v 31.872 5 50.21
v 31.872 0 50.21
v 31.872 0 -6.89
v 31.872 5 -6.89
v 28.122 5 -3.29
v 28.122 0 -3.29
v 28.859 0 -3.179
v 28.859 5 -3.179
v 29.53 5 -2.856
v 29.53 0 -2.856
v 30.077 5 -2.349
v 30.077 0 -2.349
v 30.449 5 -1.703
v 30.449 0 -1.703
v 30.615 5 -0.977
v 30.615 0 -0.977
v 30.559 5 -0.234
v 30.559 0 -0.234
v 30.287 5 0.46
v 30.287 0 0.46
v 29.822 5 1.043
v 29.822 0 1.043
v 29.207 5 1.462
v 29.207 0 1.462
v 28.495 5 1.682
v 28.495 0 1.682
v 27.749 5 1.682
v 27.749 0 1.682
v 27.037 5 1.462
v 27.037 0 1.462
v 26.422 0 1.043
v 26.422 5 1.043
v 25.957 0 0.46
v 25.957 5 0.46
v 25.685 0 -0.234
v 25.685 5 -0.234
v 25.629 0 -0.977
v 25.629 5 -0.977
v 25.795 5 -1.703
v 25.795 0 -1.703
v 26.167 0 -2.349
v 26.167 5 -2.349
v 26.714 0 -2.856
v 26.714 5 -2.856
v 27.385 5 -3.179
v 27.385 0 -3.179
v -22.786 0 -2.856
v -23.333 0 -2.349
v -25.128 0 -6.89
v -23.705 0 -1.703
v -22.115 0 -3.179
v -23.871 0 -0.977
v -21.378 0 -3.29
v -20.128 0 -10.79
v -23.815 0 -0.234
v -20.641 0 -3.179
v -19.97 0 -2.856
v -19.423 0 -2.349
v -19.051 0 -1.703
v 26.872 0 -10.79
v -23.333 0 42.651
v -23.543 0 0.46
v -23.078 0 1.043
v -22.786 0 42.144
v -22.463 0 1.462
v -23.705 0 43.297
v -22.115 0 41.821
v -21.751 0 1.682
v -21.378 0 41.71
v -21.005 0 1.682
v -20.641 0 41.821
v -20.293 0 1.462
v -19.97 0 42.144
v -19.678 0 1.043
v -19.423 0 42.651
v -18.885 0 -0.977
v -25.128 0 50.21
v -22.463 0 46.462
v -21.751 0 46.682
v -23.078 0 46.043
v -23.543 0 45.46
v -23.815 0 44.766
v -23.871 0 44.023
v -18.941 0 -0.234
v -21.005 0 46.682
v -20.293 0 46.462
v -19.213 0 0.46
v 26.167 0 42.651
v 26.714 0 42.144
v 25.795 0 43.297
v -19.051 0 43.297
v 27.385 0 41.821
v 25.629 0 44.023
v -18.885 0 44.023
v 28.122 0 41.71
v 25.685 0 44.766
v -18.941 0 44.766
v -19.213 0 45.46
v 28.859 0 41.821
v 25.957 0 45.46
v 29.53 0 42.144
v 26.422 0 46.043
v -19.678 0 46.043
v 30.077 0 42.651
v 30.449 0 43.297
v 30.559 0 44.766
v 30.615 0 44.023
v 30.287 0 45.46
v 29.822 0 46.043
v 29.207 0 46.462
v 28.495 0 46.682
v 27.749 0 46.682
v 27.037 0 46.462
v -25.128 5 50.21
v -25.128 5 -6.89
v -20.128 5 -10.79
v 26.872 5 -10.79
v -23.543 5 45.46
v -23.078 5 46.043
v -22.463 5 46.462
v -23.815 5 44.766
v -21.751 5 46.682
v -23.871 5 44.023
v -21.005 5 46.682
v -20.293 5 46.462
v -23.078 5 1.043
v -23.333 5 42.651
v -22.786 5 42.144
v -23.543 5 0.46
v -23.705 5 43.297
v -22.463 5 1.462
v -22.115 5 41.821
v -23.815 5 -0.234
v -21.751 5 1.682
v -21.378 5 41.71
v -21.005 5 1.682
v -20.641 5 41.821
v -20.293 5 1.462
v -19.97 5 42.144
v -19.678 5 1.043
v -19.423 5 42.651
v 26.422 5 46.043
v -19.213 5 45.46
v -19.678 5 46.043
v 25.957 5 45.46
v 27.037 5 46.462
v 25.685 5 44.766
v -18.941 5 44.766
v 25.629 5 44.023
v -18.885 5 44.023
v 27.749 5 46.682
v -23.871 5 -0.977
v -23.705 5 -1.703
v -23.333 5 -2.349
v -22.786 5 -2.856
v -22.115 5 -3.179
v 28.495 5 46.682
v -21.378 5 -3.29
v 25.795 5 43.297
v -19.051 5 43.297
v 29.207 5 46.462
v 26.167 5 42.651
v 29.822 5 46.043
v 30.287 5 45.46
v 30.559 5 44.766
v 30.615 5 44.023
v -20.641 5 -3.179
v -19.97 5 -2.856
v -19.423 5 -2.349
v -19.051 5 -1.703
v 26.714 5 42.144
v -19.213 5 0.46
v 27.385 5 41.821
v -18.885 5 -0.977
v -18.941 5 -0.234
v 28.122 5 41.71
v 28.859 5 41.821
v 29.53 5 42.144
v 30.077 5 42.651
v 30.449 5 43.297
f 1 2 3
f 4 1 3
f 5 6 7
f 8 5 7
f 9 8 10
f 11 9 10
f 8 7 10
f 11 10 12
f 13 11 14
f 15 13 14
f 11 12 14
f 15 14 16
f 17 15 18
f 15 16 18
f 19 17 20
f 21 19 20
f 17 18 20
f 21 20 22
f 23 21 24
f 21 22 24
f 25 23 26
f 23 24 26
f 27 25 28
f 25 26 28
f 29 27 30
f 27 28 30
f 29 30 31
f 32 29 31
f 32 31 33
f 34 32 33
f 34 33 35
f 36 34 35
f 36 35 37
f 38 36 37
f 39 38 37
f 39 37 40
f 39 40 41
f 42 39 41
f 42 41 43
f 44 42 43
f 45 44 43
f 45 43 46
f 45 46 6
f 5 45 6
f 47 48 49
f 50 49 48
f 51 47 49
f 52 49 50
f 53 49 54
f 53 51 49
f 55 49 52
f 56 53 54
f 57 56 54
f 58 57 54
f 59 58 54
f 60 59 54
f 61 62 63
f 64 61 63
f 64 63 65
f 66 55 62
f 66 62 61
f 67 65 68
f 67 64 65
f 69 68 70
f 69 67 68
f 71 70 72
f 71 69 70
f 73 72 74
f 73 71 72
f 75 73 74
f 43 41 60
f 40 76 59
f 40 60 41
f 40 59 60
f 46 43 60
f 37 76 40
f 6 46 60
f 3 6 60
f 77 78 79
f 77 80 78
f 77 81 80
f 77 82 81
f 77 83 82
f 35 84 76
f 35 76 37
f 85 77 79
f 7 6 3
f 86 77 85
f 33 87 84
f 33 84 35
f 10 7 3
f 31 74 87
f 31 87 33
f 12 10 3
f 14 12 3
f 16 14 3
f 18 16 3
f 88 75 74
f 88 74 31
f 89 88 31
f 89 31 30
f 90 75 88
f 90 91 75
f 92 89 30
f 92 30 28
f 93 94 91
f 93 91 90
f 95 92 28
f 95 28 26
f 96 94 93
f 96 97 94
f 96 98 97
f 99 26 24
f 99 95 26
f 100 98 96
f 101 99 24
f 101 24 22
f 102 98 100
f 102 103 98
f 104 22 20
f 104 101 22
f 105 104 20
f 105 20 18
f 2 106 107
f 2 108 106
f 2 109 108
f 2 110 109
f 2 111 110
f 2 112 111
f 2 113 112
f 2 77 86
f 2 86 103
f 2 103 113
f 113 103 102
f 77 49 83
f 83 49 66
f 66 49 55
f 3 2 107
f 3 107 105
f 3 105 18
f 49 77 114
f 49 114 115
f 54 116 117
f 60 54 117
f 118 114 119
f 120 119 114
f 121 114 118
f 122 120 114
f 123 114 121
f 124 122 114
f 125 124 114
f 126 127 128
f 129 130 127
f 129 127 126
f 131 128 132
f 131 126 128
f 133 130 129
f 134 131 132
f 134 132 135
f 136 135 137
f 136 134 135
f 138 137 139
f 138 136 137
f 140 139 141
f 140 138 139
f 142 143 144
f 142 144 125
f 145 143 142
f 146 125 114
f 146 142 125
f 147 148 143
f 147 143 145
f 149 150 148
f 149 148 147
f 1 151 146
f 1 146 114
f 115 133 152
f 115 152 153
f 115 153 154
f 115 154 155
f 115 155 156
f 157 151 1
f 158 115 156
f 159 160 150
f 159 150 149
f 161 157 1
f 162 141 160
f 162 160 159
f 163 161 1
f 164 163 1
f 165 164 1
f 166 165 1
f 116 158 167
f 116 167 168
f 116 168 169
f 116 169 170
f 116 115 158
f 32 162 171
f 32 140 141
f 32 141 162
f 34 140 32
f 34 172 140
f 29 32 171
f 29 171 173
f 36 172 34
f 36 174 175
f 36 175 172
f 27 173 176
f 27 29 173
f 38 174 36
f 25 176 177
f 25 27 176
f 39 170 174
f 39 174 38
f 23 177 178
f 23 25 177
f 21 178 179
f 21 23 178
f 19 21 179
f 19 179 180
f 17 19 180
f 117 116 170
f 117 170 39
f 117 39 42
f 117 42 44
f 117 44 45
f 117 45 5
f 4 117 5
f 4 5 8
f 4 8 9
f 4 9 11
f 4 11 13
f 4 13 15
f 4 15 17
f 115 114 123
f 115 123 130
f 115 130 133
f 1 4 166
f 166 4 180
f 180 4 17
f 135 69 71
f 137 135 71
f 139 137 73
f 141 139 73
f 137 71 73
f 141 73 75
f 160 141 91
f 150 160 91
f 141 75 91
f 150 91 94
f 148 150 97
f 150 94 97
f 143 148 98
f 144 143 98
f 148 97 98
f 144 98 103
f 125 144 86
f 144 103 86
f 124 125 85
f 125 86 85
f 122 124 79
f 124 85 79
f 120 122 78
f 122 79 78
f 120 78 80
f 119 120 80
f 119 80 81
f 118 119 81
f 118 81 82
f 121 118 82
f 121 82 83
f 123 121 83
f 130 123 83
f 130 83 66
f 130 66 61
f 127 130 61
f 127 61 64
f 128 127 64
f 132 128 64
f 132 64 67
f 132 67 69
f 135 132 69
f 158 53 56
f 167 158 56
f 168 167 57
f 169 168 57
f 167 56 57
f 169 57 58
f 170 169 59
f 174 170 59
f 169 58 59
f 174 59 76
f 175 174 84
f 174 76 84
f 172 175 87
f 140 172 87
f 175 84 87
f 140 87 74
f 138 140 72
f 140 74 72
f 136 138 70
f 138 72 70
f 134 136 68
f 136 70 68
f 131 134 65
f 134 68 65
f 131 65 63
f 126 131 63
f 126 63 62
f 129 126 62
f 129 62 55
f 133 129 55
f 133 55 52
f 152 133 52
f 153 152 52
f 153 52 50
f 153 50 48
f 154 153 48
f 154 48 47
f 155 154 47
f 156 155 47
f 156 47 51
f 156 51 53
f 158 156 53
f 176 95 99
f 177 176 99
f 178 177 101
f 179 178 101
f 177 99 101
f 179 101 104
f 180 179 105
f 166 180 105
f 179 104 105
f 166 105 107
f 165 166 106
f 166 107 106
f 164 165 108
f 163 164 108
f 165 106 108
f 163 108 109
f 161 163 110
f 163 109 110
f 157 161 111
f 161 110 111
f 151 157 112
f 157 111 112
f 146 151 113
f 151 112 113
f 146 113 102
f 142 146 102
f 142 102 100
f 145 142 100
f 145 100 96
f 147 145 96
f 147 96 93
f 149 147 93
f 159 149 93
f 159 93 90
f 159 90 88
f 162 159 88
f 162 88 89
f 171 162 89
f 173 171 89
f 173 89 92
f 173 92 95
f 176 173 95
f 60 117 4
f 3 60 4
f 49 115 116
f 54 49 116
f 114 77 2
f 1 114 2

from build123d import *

# Parameters (mm, degrees)
SKETCH1_W           = 57
SKETCH1_H           = 62.1
SKETCH1_W_2         = 42
SKETCH1_H_2         = 49.6
BOSS_EXTRUDE1_DEPTH = 5
SKETCH2_W           = 42
SKETCH2_H           = 49.6
BOSS_EXTRUDE2_DEPTH = 5
M6_TAPPED_HOLE1_D   = 5
CUT_EXTRUDE1_DEPTH  = 5


with BuildPart() as part:
    # Sketch1 → Boss-Extrude1 (new body)
    with BuildSketch(Plane(origin=(0, 0, 0), x_dir=(1, 0, 0), z_dir=(0, 1, 0))):
        with Locations((3.372056515, -19.15989011)):
            Rectangle(SKETCH1_W, SKETCH1_H)
        with Locations((3.372056515, -17.90989011)):
            Rectangle(SKETCH1_W_2, SKETCH1_H_2, mode=Mode.SUBTRACT)
    extrude(amount=BOSS_EXTRUDE1_DEPTH)

    # Sketch2 → Boss-Extrude2 (add)
    with BuildSketch(Plane.XZ):
        with Locations((3.372056515, 17.90989011)):
            Rectangle(SKETCH2_W, SKETCH2_H)
    extrude(amount=-BOSS_EXTRUDE2_DEPTH)

    # M6 Tapped Hole1 (through all)
    with Locations(Plane(origin=(-21.377943485, 5, -0.79010989), x_dir=(0, 0, 1), z_dir=(0, 1, 0))):
        with Locations((0, 0), (45, 0), (45, 49.5), (0, 49.5)):
            Hole(M6_TAPPED_HOLE1_D / 2)

    # Sketch9 → Cut-Extrude1 (cut)
    with BuildSketch(Plane(origin=(0, 5, 0), x_dir=(1, 0, 0), z_dir=(0, 1, 0))):
        Polygon((-25.127943485, 11.89010989), (-25.127943485, 6.89010989), (-20.128034648, 10.790006378), (26.871965352, 10.790148591), (31.872056515, 6.89010989), (31.872056515, 11.89010989), align=None)
    extrude(amount=-CUT_EXTRUDE1_DEPTH, mode=Mode.SUBTRACT)


solid = part.part
